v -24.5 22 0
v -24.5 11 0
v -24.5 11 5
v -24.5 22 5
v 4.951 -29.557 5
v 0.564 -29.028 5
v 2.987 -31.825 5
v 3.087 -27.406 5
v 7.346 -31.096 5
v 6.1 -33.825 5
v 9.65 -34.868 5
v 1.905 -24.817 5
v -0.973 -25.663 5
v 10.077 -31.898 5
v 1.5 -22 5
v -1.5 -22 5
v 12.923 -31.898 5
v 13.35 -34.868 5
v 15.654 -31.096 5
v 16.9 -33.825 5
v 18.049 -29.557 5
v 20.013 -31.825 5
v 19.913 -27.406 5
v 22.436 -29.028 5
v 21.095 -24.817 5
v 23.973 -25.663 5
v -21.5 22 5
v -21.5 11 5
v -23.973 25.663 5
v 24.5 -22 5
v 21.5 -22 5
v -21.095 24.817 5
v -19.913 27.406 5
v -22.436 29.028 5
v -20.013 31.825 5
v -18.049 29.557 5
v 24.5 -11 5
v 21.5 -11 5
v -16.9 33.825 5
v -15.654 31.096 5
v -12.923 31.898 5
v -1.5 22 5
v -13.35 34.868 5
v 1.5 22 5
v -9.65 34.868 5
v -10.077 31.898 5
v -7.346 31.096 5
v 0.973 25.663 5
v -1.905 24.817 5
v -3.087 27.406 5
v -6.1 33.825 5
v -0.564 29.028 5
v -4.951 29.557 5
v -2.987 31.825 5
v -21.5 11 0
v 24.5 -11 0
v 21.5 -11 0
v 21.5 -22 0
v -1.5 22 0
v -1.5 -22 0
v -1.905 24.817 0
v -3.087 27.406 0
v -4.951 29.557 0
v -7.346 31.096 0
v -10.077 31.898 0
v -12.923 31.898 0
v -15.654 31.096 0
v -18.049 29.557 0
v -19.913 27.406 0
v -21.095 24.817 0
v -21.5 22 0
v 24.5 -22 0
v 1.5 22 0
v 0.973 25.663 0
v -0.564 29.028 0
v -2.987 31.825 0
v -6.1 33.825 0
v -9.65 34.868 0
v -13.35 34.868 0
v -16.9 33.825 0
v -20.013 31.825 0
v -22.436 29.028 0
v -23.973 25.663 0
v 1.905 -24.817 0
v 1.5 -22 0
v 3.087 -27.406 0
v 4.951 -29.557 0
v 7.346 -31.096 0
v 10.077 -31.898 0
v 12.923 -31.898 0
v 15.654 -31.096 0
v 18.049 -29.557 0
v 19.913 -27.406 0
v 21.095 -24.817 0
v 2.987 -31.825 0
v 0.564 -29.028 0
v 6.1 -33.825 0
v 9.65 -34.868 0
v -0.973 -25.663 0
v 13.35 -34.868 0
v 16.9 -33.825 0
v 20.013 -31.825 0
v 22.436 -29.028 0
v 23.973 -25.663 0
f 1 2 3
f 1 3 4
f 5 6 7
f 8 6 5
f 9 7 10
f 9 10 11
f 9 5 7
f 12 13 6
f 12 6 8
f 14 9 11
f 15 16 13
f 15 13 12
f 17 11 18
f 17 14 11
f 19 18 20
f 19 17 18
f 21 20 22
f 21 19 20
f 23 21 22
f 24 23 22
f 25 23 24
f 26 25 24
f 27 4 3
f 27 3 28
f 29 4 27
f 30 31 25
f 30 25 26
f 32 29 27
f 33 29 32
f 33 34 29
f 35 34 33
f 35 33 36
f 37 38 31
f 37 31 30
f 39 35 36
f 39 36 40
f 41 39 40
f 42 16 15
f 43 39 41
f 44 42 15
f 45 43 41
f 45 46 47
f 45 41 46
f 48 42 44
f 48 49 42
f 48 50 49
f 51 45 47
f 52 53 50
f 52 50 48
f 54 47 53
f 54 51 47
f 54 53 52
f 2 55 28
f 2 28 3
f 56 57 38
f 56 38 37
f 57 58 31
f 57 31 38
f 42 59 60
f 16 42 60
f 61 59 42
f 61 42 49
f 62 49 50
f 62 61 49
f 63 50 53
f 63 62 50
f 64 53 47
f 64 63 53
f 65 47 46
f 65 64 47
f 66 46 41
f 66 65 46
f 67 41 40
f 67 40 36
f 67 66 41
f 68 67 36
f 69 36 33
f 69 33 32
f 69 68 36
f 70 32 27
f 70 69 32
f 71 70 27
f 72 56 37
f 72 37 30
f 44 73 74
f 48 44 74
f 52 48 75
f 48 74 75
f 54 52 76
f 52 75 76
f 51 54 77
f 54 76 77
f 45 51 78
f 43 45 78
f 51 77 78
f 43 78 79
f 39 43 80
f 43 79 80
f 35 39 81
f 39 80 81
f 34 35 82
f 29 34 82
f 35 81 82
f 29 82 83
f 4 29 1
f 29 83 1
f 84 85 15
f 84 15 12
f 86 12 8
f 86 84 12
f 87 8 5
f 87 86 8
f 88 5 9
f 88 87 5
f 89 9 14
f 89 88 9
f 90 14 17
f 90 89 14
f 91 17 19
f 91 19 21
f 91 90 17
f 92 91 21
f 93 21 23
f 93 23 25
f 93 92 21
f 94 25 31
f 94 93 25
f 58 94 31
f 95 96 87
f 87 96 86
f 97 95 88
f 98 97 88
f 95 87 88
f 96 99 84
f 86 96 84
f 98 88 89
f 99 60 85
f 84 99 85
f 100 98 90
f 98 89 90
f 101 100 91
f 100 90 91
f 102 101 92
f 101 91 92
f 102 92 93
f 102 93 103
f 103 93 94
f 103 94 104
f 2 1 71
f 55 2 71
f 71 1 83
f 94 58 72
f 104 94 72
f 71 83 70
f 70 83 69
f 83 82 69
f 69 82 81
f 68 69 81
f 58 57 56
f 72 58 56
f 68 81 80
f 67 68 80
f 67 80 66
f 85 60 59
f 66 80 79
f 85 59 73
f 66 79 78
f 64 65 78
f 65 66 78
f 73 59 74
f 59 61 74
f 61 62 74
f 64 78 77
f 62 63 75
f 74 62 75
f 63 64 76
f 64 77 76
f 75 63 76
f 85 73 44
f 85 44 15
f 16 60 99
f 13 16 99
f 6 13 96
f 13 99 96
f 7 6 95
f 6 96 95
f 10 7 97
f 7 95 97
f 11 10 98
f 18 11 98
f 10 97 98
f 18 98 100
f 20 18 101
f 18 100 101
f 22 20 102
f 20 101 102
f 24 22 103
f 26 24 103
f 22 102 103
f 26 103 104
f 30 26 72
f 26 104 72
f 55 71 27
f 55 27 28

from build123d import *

# Parameters (mm, degrees)
PAD_DEPTH = 5


with BuildPart() as part:
    # Sketch → Pad (new body)
    with BuildSketch(Plane.XY):
        with BuildLine():
            Line((-1.5, 22), (-1.5, -22))
            ThreePointArc((-1.5, -22), (11.5, -35), (24.5, -22))
            Line((24.5, -11), (24.5, -22))
            Line((21.5, -11), (24.5, -11))
            Line((21.5, -22), (21.5, -11))
            ThreePointArc((1.5, -22), (11.5, -32), (21.5, -22))
            Line((1.5, 22), (1.5, -22))
            ThreePointArc((1.5, 22), (-11.5, 35), (-24.5, 22))
            Line((-24.5, 11), (-24.5, 22))
            Line((-21.5, 11), (-24.5, 11))
            Line((-21.5, 22), (-21.5, 11))
            ThreePointArc((-1.5, 22), (-11.5, 32), (-21.5, 22))
        make_face()
    extrude(amount=PAD_DEPTH)


solid = part.part
